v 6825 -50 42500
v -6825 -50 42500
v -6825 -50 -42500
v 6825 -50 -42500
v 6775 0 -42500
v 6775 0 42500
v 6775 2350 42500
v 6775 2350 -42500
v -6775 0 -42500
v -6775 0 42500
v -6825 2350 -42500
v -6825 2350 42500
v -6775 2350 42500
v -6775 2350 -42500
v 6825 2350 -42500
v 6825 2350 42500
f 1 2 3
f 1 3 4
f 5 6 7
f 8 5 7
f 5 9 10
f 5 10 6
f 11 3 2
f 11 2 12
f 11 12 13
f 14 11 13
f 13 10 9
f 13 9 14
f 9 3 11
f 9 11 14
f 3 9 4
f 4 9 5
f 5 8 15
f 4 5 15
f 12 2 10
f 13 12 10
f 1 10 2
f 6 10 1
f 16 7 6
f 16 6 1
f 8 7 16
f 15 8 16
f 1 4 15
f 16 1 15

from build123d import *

# Parameters (mm, degrees)
SKETCH_1_W      = 13550
SKETCH_1_H      = 85000
EXTRUDE_1_DEPTH = 50
SKETCH_2_W      = 50
SKETCH_2_H      = 2400
EXTRUDE_2_DEPTH = 85000


with BuildPart() as part:
    # 草圖1 → 填料-伸長1 (new body)
    with BuildSketch(Plane(origin=(0, 0, 0), x_dir=(1, 0, 0), z_dir=(0, 1, 0))):
        Rectangle(SKETCH_1_W, SKETCH_1_H)
    extrude(amount=-EXTRUDE_1_DEPTH)

    # 草圖2 → 填料-伸長2 (add)
    with BuildSketch(Plane.XY.offset(42500)):
        with Locations((-6800, 1150)):
            Rectangle(SKETCH_2_W, SKETCH_2_H)
        with Locations((6800, 1150)):
            Rectangle(SKETCH_2_W, SKETCH_2_H)
    extrude(amount=-EXTRUDE_2_DEPTH)


solid = part.part
